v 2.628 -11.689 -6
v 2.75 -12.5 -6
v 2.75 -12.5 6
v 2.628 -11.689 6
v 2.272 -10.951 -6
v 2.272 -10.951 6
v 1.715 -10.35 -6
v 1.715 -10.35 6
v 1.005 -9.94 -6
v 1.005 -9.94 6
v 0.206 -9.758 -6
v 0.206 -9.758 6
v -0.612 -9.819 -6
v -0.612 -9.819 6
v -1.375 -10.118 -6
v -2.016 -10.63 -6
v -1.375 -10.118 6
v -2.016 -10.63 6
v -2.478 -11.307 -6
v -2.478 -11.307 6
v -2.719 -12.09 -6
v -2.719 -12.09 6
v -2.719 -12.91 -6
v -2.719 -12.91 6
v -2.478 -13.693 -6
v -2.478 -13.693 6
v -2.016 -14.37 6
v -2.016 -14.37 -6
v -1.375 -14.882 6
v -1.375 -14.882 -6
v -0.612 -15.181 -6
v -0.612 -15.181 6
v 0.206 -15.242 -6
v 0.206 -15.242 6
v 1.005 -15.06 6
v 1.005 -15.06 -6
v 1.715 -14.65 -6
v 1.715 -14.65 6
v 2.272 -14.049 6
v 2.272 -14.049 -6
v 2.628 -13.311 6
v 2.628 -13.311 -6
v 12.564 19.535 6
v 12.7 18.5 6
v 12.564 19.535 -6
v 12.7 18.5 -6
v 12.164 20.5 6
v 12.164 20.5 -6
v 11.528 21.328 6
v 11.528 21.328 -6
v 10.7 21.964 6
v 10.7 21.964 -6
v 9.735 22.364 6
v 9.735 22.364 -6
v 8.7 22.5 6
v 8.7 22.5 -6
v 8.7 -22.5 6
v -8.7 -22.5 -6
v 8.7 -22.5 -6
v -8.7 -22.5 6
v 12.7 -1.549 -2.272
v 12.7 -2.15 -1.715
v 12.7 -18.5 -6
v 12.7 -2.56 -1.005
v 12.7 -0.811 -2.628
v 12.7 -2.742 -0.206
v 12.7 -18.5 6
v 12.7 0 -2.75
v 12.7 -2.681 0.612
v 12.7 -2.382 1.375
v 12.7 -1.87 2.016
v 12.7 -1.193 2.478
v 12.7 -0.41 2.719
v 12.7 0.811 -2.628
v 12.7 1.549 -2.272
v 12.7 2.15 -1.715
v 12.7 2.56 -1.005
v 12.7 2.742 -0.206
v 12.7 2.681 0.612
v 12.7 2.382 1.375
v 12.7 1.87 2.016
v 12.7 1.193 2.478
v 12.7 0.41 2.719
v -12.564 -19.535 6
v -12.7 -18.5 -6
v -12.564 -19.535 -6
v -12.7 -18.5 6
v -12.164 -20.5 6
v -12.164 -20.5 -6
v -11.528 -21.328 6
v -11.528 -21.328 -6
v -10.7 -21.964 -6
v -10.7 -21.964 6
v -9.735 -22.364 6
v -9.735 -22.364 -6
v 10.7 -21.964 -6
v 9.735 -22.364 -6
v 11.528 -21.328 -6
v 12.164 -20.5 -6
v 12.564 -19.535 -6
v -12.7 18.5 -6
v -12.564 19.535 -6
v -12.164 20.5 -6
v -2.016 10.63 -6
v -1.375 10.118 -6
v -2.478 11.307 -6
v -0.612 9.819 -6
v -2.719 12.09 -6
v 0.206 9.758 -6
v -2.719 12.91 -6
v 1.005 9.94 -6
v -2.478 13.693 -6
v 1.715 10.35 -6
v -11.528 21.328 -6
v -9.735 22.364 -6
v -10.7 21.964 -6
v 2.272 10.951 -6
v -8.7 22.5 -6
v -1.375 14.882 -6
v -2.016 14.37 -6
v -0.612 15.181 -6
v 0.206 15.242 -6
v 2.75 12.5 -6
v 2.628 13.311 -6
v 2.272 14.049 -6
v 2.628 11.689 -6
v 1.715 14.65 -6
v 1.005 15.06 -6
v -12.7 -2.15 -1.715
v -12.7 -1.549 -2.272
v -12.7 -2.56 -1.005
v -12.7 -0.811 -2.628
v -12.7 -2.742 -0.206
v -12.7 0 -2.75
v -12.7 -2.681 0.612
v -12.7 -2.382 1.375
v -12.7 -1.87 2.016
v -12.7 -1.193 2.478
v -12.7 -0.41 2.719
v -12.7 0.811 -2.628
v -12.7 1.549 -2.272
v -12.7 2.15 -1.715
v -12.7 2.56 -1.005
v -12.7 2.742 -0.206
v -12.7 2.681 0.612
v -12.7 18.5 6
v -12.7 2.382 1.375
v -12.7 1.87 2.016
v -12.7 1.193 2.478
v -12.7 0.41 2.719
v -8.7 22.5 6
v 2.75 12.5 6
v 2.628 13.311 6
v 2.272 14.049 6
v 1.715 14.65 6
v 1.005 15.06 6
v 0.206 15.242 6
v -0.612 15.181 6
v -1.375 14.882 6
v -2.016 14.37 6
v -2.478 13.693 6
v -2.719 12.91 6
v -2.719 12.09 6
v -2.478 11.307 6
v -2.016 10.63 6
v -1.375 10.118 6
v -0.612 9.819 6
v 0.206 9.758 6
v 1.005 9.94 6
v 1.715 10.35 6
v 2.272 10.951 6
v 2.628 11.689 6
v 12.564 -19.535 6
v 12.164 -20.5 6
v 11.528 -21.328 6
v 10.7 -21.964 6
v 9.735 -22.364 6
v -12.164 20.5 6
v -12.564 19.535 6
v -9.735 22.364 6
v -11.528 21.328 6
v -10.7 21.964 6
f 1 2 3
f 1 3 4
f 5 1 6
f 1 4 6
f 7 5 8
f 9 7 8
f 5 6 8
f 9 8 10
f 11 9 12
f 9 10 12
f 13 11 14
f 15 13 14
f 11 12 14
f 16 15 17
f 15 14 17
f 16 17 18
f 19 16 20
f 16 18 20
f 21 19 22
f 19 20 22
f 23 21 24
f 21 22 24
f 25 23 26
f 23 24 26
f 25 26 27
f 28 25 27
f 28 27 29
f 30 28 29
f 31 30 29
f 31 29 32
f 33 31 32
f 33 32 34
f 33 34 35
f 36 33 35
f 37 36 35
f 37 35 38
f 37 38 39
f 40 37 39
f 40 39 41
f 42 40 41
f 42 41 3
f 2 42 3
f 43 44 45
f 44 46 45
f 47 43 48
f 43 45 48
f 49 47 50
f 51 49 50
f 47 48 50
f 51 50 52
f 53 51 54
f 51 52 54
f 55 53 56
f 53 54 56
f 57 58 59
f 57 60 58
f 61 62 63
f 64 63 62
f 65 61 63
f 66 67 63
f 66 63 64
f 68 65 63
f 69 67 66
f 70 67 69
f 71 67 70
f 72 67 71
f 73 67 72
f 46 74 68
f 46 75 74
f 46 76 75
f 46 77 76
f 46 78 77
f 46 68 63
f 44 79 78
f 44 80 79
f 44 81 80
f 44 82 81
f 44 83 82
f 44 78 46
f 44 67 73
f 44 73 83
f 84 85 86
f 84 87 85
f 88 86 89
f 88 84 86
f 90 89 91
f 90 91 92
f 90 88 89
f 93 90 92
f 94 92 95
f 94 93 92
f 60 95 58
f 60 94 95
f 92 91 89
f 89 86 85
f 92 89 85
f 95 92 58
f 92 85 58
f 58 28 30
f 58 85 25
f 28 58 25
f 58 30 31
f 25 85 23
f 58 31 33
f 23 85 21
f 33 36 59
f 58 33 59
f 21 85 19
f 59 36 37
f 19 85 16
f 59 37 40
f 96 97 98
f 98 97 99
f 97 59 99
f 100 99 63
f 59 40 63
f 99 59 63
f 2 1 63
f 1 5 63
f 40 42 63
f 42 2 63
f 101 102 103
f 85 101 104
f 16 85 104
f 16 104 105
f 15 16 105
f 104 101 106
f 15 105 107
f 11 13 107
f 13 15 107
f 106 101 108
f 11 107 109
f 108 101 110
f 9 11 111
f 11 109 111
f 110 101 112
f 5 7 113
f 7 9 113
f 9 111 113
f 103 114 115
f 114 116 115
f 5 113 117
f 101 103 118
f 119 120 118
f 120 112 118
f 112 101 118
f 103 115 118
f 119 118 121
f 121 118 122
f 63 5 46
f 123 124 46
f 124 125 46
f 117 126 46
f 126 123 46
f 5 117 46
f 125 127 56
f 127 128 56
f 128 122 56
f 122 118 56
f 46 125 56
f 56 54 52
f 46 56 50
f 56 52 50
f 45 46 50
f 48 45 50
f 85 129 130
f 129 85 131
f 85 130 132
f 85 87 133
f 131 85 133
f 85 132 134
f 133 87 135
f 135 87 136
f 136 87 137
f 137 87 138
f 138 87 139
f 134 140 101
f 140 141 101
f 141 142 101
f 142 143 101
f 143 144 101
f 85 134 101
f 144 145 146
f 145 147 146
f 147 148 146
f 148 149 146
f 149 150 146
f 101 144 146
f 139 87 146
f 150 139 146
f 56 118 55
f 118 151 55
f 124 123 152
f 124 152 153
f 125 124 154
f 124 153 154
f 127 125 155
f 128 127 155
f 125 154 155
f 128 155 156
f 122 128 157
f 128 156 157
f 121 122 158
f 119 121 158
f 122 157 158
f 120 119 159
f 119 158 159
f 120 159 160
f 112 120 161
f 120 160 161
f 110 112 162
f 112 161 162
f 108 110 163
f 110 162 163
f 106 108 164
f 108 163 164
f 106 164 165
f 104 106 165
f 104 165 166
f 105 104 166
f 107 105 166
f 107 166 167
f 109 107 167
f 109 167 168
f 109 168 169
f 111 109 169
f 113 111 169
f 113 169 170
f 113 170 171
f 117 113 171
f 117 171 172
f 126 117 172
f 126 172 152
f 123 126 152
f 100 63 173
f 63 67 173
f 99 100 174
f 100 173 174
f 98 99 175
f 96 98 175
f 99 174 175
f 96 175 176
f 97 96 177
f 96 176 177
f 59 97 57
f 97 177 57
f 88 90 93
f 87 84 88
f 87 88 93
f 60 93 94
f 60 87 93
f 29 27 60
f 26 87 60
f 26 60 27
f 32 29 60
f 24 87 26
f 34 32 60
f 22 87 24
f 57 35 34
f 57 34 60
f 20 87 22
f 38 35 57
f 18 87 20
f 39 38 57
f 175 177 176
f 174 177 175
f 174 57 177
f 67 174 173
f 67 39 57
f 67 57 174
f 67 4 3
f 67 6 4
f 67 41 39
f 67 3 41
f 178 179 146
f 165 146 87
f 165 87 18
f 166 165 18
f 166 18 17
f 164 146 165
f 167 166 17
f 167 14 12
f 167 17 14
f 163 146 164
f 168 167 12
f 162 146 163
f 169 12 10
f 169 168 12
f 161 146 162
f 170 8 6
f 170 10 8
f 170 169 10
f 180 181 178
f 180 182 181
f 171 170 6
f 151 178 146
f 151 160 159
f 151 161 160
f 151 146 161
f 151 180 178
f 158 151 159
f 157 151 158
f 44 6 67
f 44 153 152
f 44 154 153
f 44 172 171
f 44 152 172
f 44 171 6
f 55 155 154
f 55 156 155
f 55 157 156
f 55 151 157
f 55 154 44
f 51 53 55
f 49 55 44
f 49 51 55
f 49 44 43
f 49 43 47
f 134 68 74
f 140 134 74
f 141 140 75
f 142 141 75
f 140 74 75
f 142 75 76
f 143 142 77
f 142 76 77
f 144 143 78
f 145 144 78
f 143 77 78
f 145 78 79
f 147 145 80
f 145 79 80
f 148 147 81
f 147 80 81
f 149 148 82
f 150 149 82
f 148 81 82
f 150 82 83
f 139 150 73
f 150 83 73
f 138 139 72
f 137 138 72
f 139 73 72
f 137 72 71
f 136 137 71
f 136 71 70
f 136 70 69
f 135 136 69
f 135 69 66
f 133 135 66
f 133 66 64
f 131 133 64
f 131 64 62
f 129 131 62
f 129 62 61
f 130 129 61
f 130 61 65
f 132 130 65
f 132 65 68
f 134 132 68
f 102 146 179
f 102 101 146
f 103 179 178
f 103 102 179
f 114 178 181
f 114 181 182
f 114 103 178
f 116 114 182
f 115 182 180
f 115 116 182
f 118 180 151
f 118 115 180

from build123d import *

# Parameters (mm, degrees)
SKETCH1_W            = 25.4
SKETCH1_H            = 45
BOSS_EXTRUDE1_DEPTH  = 6
FILLET1_R            = 4
M5_CLEARANCE_HOLE1_D = 5.5
M5_CLEARANCE_HOLE2_D = 5.5


with BuildPart() as part:
    # Sketch1 → Boss-Extrude1 (new body, symmetric)
    with BuildSketch(Plane.XY):
        Rectangle(SKETCH1_W, SKETCH1_H)
    extrude(amount=BOSS_EXTRUDE1_DEPTH, both=True)

    # Fillet1
    fillet1_edges = [part.edges().sort_by_distance(p)[0] for p in [
        (-12.7, 22.5, 0),
        (12.7, 22.5, 0),
        (12.7, -22.5, 0),
        (-12.7, -22.5, 0),
    ]]
    fillet(fillet1_edges, radius=FILLET1_R)

    # M5 Clearance Hole1 (through all)
    with Locations(Plane.ZY.offset(12.7)):
        with Locations((0, 0)):
            Hole(M5_CLEARANCE_HOLE1_D / 2)

    # M5 Clearance Hole2 (through all)
    with Locations(Plane(origin=(0, 0, -6), x_dir=(-1, 0, 0), z_dir=(0, 0, -1))):
        with Locations((0, 12.5), (0, -12.5)):
            Hole(M5_CLEARANCE_HOLE2_D / 2)


solid = part.part
